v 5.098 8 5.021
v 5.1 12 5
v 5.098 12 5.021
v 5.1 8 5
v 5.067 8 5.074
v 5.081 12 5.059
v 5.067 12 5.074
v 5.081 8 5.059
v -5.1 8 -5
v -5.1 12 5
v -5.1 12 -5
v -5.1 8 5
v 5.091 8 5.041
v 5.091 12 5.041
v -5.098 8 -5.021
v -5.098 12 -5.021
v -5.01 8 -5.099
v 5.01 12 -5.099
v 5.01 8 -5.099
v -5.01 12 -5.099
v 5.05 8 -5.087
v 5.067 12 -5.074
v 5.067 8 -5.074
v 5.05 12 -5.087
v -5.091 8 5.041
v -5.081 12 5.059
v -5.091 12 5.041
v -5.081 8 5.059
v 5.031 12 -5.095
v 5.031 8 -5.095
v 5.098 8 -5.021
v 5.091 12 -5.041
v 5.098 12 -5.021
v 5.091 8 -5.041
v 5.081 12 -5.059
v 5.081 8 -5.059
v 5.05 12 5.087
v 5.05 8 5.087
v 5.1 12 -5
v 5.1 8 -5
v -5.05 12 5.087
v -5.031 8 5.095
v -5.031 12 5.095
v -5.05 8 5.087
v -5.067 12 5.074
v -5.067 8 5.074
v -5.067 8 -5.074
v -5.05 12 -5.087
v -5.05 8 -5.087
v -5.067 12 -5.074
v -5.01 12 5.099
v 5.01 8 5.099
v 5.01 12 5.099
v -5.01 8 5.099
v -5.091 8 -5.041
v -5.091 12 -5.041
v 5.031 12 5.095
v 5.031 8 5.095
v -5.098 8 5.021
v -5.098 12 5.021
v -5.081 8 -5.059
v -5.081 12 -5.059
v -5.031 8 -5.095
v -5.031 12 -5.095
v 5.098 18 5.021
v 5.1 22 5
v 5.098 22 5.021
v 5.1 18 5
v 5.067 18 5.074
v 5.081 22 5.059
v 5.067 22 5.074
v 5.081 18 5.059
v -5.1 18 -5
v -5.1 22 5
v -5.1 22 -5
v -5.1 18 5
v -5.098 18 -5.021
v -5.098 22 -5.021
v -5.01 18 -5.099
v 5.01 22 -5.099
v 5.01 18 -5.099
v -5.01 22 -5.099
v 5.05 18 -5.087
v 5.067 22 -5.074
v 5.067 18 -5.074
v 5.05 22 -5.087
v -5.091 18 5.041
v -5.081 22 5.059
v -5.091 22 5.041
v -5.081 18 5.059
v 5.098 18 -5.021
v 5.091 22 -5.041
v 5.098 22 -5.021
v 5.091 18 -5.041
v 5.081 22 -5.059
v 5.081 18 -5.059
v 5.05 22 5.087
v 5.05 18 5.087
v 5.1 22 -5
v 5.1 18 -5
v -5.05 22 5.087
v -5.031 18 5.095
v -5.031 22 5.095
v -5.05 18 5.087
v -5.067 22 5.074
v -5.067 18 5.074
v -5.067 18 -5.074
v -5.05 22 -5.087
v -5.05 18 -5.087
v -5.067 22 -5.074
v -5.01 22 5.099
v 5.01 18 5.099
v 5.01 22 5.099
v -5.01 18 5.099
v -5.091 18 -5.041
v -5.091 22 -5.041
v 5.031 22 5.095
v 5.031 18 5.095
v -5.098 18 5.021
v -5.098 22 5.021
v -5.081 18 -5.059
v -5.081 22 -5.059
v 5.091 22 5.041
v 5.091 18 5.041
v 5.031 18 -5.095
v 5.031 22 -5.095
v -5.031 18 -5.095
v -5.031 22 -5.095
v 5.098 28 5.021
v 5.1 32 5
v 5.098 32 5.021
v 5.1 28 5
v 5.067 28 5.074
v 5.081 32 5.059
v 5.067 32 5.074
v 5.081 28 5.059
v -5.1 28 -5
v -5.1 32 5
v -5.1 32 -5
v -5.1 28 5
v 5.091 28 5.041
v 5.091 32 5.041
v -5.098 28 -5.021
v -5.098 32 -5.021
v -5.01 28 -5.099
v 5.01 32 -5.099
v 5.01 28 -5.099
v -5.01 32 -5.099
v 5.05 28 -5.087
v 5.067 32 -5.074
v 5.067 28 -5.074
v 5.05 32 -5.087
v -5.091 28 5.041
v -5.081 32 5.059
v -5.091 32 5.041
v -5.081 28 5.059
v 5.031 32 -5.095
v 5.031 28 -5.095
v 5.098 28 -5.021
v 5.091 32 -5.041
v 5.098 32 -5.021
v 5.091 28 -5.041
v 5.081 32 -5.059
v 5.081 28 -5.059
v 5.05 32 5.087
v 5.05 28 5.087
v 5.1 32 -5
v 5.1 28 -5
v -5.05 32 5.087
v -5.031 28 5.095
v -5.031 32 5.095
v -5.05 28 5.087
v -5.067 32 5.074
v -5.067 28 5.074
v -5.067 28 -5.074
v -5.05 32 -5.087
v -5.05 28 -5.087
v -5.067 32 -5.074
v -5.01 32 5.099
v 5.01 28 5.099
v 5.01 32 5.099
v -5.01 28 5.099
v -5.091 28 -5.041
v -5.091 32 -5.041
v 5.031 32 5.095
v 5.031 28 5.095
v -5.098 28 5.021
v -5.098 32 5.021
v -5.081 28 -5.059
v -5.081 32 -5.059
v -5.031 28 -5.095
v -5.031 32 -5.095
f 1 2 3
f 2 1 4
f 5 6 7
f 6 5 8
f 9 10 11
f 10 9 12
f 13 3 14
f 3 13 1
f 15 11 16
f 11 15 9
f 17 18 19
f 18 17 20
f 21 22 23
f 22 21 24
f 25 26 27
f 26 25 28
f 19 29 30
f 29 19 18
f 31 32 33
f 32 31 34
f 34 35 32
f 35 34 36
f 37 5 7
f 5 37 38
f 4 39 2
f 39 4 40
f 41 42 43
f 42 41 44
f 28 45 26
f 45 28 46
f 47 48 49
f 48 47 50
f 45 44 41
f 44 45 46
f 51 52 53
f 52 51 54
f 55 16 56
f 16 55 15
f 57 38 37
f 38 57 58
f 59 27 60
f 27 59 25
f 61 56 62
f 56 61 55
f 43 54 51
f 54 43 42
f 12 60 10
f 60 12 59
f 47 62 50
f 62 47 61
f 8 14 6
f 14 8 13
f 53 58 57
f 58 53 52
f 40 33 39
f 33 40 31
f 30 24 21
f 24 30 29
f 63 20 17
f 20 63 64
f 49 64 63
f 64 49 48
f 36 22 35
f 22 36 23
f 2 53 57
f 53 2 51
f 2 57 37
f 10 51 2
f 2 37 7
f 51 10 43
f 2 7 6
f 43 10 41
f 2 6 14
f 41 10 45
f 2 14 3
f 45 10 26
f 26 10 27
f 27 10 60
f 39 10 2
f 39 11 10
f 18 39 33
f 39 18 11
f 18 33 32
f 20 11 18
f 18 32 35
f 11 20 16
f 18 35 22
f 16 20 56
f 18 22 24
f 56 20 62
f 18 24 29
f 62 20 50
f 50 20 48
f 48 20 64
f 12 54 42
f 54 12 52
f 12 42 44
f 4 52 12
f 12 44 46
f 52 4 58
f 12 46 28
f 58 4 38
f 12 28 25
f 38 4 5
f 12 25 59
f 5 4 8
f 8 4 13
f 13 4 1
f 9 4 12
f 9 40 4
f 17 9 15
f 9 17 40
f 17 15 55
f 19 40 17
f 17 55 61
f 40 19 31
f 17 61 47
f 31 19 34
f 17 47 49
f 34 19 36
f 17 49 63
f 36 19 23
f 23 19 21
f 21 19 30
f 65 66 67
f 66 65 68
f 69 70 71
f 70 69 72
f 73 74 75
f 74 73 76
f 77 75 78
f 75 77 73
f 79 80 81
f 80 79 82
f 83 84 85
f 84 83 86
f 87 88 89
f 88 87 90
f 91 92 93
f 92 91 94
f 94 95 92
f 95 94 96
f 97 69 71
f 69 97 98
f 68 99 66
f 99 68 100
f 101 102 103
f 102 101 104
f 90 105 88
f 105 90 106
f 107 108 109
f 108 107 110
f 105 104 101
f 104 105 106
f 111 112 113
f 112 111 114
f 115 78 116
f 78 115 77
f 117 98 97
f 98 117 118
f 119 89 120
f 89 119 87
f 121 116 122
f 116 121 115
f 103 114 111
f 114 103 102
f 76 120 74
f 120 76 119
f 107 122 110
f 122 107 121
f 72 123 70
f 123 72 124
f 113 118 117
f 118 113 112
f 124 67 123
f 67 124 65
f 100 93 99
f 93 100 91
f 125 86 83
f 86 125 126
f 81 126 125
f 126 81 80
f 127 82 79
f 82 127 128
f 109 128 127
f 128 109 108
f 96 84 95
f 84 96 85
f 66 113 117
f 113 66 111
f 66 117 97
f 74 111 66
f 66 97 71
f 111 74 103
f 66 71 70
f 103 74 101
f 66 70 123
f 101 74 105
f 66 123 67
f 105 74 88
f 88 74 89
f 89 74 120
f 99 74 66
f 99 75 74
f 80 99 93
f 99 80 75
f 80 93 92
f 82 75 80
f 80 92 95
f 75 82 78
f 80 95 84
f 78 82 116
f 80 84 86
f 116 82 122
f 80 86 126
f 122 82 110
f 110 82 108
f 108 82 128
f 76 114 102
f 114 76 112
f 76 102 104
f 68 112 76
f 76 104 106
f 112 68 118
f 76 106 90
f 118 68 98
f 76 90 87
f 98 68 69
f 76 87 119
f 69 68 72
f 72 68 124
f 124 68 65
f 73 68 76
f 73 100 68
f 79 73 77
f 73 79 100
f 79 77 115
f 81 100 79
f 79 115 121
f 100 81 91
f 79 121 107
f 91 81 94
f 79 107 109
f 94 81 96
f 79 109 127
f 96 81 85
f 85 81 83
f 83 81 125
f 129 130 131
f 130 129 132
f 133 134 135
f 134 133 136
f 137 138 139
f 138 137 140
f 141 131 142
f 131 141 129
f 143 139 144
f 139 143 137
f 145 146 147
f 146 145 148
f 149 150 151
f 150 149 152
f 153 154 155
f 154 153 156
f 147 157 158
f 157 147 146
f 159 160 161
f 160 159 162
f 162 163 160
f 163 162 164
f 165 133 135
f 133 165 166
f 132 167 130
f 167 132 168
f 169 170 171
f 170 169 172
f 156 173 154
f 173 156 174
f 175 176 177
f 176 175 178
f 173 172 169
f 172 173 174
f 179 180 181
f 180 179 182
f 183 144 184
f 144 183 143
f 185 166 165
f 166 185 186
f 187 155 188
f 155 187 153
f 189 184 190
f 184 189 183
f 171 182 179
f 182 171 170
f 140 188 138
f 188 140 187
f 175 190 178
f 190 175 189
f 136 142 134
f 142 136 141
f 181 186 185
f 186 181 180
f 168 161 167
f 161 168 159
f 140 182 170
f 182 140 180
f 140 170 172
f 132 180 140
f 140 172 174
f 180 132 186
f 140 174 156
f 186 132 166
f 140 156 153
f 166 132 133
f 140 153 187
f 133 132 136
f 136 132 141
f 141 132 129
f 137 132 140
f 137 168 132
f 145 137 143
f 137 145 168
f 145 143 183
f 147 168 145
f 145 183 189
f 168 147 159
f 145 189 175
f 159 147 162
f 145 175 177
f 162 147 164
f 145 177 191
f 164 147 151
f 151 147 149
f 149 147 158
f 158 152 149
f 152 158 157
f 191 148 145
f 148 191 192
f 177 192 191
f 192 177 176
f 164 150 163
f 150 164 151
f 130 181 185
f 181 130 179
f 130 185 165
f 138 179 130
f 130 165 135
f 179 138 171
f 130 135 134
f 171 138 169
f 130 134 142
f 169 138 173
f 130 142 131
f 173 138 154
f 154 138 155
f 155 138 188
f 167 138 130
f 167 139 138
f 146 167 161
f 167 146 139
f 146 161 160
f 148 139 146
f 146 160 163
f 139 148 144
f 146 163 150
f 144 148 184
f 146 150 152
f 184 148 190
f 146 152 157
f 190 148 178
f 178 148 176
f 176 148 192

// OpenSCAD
//-------------------------------------------------------------------------------------------
// Temp Tower
//---------------------------
// Nozzle 0.4
//---------------------------
// TempTower Script
//---------------------------
// StartTempTower       : 220 
// Incremental Temp     : -5
//---------------------------
// Layer = 0.2
// Layer Change         : 38
// Offset Layer         : 4
//---------------------------
// Layer = 0.16 (First layer 0.2)
// Layer Change         : 48
// Offset Layer         : 5
//---------------------------
// Based on a design proposed by stoempie https://www.thingiverse.com/thing:2493504
// Freely adapted by 5@xes  2020
//-------------------------------------------------------------------------------------------

$fn=30;
font = "Arial:style=Bold";

letter_size = 1;
letter_height = 0.8;


rotate(90,[-1, 0, 0]) translate([0, 0, 0]) union() {
  translate([0, 0, 10]) OneStep("0.1");
  translate([0, 0, 20]) OneStep("0.3");
  translate([0, 0, 30]) OneStep("0.5");
}



module letter(Txt) {
  color("Yellow")
  linear_extrude(height = letter_height) {
    text(Txt, size = letter_size, font = font, halign = "center", valign = "center");
  }
}

module OneStep(Txt){
difference() {
  color("gray")
      Etage();
      color("blue") translate([20, letter_height-0.01, 5]) rotate([90, 0, 0]) letter(Txt);
}
}


module Etage() {
    minkowski() {
    translate([0, 0, 0]) cube([10,10,3], center = true);
    cylinder(r=0.1,h=1, center = true);
    }
}
